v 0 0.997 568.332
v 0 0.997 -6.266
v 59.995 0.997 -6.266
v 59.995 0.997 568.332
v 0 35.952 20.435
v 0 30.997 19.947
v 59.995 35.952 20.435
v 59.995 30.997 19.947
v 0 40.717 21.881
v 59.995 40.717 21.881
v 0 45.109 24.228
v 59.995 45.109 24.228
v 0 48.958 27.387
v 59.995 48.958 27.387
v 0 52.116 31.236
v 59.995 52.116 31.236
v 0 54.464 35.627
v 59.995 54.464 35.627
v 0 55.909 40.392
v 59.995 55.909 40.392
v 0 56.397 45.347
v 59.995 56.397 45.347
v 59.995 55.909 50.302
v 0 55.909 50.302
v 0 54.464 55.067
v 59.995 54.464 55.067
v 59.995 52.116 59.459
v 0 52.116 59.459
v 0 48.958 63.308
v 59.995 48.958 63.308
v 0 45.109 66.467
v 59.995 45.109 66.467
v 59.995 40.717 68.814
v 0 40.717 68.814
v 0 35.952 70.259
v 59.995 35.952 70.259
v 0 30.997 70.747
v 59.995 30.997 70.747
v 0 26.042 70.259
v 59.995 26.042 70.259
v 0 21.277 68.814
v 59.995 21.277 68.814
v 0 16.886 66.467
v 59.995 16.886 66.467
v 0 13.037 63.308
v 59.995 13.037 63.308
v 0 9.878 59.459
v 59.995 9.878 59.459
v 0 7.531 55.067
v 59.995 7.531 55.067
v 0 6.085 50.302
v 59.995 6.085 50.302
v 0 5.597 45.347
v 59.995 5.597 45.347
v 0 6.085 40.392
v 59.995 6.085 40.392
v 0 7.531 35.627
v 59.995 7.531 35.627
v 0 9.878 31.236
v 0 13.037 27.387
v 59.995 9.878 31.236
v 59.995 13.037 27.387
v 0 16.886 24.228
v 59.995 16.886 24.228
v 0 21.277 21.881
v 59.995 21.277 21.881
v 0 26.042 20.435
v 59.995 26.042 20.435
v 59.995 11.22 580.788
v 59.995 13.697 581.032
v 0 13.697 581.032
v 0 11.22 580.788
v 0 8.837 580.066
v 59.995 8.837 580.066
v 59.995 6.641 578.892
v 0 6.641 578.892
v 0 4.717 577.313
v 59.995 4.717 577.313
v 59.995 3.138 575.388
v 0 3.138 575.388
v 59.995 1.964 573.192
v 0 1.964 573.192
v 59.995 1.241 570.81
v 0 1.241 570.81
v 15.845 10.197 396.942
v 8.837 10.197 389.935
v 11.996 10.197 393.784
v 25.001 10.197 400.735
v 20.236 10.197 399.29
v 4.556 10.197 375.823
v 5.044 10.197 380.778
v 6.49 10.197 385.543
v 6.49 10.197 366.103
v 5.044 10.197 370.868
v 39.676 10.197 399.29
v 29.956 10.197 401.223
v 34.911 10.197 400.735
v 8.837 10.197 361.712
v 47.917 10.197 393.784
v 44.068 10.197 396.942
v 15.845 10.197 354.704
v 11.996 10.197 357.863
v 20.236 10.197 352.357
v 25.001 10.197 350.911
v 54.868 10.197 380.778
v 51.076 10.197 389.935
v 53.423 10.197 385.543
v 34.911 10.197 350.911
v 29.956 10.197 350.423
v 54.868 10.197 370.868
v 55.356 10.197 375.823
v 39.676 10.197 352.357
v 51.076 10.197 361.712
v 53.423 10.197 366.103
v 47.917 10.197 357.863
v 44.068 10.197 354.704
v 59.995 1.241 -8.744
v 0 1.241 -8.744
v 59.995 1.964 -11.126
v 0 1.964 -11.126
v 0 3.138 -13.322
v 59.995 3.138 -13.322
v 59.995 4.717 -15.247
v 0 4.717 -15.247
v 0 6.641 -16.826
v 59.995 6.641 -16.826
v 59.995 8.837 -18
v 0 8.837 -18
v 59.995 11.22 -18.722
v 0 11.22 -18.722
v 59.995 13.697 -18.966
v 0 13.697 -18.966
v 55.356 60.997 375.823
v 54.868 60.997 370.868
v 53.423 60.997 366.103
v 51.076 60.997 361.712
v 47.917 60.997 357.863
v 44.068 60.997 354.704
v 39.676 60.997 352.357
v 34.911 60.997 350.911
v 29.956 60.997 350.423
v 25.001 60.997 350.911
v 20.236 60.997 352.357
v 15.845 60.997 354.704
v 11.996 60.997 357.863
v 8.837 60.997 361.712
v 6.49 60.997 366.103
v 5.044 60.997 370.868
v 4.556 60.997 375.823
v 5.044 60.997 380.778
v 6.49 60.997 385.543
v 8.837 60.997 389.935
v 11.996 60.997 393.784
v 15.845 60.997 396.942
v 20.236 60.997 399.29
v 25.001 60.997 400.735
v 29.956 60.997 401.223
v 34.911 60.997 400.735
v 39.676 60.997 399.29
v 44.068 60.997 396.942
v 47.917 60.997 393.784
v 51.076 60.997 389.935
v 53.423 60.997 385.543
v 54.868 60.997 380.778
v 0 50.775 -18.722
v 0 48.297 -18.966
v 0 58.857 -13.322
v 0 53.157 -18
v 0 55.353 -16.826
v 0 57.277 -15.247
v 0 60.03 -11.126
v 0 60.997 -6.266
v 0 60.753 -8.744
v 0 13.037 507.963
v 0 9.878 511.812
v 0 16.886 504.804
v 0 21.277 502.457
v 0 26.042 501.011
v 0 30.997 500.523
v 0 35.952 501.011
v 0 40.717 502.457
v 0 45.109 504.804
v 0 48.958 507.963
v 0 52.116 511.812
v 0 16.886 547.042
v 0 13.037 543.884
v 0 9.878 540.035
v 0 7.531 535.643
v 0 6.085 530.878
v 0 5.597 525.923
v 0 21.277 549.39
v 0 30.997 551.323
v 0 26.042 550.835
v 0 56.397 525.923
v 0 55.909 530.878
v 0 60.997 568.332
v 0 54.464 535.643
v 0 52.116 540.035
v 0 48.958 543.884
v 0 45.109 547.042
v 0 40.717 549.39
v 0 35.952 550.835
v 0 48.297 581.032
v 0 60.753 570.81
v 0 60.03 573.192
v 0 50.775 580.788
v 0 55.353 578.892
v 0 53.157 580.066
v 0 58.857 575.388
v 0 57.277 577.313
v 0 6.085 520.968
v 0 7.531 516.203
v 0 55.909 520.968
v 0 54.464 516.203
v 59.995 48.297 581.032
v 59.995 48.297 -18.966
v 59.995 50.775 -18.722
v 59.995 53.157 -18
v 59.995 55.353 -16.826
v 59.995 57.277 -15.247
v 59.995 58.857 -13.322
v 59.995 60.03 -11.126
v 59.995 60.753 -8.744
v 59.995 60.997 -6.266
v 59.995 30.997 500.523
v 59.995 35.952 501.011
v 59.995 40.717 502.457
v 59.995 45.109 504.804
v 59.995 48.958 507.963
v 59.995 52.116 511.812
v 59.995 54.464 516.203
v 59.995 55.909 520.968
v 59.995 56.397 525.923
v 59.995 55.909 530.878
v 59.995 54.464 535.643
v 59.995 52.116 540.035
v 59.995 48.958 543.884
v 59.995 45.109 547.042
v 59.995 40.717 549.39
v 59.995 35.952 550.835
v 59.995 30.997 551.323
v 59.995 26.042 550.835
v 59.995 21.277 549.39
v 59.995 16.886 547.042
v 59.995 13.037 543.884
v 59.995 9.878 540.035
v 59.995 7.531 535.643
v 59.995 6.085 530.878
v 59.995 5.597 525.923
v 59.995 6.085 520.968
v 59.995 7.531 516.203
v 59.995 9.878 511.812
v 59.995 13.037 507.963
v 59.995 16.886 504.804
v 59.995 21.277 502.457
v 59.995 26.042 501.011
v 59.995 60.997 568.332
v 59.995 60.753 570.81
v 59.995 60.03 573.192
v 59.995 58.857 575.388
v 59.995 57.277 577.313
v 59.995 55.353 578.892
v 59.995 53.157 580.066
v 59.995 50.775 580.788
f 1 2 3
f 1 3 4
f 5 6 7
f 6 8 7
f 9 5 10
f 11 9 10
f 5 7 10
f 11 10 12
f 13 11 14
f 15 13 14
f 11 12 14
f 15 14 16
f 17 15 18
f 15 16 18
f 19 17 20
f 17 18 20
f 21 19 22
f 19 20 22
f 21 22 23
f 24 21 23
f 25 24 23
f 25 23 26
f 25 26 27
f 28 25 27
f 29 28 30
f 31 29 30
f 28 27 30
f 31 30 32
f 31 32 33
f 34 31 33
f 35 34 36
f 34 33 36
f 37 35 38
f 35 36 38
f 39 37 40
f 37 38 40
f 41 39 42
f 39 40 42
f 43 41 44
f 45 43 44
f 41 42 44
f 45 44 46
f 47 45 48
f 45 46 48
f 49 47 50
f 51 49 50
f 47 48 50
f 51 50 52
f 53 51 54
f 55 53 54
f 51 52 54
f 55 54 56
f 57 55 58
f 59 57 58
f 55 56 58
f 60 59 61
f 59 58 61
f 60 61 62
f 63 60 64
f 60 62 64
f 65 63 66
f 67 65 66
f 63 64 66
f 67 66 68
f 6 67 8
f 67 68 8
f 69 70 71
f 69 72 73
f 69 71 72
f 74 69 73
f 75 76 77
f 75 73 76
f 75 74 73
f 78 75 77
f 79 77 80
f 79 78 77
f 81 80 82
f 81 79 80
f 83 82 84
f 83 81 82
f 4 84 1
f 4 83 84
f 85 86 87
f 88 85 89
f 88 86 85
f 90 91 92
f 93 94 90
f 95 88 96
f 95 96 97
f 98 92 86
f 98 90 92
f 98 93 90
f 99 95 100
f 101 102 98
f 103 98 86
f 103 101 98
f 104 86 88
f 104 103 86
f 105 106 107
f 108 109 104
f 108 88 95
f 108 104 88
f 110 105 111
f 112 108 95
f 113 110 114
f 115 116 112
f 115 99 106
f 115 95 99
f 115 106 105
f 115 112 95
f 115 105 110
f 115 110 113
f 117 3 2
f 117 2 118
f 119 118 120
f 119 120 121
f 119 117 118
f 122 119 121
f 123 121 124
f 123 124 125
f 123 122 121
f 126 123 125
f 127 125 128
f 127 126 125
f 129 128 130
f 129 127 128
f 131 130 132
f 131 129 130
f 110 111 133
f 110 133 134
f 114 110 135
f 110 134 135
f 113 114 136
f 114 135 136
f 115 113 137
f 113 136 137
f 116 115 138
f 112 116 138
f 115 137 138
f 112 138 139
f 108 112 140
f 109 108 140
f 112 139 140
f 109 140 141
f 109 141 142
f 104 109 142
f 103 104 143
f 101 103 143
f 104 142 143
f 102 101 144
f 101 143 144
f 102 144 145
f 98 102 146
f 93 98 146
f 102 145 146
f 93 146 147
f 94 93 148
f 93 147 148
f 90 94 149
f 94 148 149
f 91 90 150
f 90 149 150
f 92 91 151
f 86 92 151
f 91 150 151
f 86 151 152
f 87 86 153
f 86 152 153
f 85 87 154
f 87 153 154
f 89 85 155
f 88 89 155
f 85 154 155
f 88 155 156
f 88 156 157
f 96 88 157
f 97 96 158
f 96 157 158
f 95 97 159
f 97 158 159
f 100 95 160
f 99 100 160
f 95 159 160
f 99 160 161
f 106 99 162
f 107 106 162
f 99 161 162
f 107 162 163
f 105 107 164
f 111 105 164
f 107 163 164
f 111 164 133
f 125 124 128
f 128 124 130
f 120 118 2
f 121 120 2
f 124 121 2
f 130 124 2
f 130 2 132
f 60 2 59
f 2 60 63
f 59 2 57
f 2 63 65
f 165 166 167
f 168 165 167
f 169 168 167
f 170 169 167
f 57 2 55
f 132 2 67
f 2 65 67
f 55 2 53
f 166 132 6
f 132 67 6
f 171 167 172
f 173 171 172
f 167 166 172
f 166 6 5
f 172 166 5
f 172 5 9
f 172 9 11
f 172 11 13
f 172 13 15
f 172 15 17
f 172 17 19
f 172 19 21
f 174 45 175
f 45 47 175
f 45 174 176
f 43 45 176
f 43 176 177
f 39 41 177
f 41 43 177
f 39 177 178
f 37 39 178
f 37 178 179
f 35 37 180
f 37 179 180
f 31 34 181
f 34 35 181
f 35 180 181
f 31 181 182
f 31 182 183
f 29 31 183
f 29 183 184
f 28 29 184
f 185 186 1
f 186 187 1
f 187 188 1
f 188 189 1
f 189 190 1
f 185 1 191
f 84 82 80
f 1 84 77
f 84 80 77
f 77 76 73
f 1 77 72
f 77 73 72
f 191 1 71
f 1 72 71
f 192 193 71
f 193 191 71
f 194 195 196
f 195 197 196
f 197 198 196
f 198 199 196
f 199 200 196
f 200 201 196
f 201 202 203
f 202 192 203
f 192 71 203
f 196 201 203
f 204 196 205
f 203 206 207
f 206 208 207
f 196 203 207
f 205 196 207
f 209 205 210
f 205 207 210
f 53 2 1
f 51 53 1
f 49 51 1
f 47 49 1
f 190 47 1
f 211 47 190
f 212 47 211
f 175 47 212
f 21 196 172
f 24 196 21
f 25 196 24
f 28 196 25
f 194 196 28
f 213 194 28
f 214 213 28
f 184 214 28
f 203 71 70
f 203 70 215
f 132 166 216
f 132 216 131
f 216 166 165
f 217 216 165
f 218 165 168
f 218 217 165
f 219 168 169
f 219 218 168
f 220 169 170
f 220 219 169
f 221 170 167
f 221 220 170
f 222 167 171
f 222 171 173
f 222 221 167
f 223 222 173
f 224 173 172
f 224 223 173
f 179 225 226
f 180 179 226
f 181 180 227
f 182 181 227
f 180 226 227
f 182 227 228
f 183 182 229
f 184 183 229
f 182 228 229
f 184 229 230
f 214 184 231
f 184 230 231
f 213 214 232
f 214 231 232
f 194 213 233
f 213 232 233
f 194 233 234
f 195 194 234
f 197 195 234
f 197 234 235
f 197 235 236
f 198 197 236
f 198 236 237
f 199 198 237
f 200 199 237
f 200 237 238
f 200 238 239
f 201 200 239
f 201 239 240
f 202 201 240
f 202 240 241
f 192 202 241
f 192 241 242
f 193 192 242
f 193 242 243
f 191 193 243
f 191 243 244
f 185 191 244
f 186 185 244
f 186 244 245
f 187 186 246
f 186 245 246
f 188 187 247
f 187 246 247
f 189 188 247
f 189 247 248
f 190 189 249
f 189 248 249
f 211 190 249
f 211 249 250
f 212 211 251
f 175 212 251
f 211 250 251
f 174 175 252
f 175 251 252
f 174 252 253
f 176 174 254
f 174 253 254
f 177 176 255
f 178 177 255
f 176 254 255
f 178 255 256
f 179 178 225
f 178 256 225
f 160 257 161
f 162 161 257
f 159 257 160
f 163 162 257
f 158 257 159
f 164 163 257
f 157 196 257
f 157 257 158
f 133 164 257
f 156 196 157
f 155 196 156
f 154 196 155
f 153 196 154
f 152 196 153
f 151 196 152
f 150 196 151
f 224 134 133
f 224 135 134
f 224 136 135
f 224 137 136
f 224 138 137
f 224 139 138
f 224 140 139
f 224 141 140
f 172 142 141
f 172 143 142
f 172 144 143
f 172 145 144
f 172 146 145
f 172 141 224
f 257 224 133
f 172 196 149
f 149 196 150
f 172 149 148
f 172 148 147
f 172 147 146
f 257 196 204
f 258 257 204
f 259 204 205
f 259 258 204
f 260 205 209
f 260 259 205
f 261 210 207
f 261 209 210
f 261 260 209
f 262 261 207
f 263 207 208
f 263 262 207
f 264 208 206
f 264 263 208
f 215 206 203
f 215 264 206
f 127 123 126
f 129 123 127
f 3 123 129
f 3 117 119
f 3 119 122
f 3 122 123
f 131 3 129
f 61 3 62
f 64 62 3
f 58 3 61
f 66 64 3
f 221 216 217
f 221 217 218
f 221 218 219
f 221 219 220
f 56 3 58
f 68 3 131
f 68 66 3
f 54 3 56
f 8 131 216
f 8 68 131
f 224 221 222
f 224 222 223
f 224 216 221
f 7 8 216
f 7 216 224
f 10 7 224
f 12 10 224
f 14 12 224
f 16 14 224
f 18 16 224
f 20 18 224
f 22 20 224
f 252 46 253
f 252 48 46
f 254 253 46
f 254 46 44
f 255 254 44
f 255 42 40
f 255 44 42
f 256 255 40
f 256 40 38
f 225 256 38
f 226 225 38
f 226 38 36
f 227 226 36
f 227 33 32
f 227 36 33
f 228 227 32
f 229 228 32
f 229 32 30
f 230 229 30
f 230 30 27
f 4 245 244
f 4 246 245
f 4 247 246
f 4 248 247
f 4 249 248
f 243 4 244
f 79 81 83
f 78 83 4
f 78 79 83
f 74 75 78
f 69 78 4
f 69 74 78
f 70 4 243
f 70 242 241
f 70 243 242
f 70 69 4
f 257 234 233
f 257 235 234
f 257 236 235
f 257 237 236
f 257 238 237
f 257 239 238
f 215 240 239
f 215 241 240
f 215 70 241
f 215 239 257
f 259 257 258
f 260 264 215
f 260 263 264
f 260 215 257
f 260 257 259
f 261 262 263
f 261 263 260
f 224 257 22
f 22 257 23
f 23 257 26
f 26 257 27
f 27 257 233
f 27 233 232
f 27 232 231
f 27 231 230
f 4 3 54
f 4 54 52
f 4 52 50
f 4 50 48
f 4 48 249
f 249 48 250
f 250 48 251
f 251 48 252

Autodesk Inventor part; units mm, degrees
ref_plane "YZ Plane" through (0, 0, 0) normal (1, 0, 0) x (0, 1, 0)
ref_plane "XZ Plane" through (0, 0, 0) normal (0, 1, 0) x (-1, 0, 0)
ref_plane "XY Plane" through (0, 0, 0) normal (0, 0, 1) x (1, 0, 0)
sketch "Sketch1" plane through (0, 0, 0) normal (1, 0, 0) x (0, 1, 0)
  line L0 (0.9972, 8.0994) -> (0.9972, -18.9664)
  line L1 (0.9972, -18.9664) -> (0.9972, 581.0324)
  line L2 (0.9972, 581.0324) -> (60.997, 581.0324)
  line L3 (60.997, 581.0324) -> (60.997, -18.9664)
  line L4 (60.997, -18.9664) -> (0.9972, -18.9664)
  point P0 (0, 0)
  dimension "d0" = 599.9988
  dimension "d1" = 59.9999
extrude "Extrusion1" add sketch "Sketch1" along normal blind 59.9948
sketch "Sketch2" plane through (59.9948, 0, 0) normal (1, 0, 0) x (0, 0, -1)
  circle A0 centre (-525.9231, 30.9971) radius 25.4
  circle A1 centre (-45.3472, 30.9971) radius 25.4
  point P0 (0, 0)
  dimension "d4" = 50.8
  dimension "d5" = 50.8
extrude "Extrusion2" cut sketch "Sketch2" against normal blind 59.9948
fillet "Fillet1" radius 12.7 4 edges at (29.9974, 60.997, 581.0324) (29.9974, 0.9972, 581.0324) (29.9974, 60.997, -18.9664) (29.9974, 0.9972, -18.9664)
sketch "Sketch3" plane through (0, 60.997, 568.3324) normal (0, 1, 0) x (1, 0, 0)
  circle A0 centre (29.9562, 192.5093) radius 25.4
  point P0 (0, 568.3324)
  dimension "d9" = 50.8
extrude "Extrusion3" cut sketch "Sketch3" against normal blind 50.8
properties part number "legrod" material "Wood (Birch)"
